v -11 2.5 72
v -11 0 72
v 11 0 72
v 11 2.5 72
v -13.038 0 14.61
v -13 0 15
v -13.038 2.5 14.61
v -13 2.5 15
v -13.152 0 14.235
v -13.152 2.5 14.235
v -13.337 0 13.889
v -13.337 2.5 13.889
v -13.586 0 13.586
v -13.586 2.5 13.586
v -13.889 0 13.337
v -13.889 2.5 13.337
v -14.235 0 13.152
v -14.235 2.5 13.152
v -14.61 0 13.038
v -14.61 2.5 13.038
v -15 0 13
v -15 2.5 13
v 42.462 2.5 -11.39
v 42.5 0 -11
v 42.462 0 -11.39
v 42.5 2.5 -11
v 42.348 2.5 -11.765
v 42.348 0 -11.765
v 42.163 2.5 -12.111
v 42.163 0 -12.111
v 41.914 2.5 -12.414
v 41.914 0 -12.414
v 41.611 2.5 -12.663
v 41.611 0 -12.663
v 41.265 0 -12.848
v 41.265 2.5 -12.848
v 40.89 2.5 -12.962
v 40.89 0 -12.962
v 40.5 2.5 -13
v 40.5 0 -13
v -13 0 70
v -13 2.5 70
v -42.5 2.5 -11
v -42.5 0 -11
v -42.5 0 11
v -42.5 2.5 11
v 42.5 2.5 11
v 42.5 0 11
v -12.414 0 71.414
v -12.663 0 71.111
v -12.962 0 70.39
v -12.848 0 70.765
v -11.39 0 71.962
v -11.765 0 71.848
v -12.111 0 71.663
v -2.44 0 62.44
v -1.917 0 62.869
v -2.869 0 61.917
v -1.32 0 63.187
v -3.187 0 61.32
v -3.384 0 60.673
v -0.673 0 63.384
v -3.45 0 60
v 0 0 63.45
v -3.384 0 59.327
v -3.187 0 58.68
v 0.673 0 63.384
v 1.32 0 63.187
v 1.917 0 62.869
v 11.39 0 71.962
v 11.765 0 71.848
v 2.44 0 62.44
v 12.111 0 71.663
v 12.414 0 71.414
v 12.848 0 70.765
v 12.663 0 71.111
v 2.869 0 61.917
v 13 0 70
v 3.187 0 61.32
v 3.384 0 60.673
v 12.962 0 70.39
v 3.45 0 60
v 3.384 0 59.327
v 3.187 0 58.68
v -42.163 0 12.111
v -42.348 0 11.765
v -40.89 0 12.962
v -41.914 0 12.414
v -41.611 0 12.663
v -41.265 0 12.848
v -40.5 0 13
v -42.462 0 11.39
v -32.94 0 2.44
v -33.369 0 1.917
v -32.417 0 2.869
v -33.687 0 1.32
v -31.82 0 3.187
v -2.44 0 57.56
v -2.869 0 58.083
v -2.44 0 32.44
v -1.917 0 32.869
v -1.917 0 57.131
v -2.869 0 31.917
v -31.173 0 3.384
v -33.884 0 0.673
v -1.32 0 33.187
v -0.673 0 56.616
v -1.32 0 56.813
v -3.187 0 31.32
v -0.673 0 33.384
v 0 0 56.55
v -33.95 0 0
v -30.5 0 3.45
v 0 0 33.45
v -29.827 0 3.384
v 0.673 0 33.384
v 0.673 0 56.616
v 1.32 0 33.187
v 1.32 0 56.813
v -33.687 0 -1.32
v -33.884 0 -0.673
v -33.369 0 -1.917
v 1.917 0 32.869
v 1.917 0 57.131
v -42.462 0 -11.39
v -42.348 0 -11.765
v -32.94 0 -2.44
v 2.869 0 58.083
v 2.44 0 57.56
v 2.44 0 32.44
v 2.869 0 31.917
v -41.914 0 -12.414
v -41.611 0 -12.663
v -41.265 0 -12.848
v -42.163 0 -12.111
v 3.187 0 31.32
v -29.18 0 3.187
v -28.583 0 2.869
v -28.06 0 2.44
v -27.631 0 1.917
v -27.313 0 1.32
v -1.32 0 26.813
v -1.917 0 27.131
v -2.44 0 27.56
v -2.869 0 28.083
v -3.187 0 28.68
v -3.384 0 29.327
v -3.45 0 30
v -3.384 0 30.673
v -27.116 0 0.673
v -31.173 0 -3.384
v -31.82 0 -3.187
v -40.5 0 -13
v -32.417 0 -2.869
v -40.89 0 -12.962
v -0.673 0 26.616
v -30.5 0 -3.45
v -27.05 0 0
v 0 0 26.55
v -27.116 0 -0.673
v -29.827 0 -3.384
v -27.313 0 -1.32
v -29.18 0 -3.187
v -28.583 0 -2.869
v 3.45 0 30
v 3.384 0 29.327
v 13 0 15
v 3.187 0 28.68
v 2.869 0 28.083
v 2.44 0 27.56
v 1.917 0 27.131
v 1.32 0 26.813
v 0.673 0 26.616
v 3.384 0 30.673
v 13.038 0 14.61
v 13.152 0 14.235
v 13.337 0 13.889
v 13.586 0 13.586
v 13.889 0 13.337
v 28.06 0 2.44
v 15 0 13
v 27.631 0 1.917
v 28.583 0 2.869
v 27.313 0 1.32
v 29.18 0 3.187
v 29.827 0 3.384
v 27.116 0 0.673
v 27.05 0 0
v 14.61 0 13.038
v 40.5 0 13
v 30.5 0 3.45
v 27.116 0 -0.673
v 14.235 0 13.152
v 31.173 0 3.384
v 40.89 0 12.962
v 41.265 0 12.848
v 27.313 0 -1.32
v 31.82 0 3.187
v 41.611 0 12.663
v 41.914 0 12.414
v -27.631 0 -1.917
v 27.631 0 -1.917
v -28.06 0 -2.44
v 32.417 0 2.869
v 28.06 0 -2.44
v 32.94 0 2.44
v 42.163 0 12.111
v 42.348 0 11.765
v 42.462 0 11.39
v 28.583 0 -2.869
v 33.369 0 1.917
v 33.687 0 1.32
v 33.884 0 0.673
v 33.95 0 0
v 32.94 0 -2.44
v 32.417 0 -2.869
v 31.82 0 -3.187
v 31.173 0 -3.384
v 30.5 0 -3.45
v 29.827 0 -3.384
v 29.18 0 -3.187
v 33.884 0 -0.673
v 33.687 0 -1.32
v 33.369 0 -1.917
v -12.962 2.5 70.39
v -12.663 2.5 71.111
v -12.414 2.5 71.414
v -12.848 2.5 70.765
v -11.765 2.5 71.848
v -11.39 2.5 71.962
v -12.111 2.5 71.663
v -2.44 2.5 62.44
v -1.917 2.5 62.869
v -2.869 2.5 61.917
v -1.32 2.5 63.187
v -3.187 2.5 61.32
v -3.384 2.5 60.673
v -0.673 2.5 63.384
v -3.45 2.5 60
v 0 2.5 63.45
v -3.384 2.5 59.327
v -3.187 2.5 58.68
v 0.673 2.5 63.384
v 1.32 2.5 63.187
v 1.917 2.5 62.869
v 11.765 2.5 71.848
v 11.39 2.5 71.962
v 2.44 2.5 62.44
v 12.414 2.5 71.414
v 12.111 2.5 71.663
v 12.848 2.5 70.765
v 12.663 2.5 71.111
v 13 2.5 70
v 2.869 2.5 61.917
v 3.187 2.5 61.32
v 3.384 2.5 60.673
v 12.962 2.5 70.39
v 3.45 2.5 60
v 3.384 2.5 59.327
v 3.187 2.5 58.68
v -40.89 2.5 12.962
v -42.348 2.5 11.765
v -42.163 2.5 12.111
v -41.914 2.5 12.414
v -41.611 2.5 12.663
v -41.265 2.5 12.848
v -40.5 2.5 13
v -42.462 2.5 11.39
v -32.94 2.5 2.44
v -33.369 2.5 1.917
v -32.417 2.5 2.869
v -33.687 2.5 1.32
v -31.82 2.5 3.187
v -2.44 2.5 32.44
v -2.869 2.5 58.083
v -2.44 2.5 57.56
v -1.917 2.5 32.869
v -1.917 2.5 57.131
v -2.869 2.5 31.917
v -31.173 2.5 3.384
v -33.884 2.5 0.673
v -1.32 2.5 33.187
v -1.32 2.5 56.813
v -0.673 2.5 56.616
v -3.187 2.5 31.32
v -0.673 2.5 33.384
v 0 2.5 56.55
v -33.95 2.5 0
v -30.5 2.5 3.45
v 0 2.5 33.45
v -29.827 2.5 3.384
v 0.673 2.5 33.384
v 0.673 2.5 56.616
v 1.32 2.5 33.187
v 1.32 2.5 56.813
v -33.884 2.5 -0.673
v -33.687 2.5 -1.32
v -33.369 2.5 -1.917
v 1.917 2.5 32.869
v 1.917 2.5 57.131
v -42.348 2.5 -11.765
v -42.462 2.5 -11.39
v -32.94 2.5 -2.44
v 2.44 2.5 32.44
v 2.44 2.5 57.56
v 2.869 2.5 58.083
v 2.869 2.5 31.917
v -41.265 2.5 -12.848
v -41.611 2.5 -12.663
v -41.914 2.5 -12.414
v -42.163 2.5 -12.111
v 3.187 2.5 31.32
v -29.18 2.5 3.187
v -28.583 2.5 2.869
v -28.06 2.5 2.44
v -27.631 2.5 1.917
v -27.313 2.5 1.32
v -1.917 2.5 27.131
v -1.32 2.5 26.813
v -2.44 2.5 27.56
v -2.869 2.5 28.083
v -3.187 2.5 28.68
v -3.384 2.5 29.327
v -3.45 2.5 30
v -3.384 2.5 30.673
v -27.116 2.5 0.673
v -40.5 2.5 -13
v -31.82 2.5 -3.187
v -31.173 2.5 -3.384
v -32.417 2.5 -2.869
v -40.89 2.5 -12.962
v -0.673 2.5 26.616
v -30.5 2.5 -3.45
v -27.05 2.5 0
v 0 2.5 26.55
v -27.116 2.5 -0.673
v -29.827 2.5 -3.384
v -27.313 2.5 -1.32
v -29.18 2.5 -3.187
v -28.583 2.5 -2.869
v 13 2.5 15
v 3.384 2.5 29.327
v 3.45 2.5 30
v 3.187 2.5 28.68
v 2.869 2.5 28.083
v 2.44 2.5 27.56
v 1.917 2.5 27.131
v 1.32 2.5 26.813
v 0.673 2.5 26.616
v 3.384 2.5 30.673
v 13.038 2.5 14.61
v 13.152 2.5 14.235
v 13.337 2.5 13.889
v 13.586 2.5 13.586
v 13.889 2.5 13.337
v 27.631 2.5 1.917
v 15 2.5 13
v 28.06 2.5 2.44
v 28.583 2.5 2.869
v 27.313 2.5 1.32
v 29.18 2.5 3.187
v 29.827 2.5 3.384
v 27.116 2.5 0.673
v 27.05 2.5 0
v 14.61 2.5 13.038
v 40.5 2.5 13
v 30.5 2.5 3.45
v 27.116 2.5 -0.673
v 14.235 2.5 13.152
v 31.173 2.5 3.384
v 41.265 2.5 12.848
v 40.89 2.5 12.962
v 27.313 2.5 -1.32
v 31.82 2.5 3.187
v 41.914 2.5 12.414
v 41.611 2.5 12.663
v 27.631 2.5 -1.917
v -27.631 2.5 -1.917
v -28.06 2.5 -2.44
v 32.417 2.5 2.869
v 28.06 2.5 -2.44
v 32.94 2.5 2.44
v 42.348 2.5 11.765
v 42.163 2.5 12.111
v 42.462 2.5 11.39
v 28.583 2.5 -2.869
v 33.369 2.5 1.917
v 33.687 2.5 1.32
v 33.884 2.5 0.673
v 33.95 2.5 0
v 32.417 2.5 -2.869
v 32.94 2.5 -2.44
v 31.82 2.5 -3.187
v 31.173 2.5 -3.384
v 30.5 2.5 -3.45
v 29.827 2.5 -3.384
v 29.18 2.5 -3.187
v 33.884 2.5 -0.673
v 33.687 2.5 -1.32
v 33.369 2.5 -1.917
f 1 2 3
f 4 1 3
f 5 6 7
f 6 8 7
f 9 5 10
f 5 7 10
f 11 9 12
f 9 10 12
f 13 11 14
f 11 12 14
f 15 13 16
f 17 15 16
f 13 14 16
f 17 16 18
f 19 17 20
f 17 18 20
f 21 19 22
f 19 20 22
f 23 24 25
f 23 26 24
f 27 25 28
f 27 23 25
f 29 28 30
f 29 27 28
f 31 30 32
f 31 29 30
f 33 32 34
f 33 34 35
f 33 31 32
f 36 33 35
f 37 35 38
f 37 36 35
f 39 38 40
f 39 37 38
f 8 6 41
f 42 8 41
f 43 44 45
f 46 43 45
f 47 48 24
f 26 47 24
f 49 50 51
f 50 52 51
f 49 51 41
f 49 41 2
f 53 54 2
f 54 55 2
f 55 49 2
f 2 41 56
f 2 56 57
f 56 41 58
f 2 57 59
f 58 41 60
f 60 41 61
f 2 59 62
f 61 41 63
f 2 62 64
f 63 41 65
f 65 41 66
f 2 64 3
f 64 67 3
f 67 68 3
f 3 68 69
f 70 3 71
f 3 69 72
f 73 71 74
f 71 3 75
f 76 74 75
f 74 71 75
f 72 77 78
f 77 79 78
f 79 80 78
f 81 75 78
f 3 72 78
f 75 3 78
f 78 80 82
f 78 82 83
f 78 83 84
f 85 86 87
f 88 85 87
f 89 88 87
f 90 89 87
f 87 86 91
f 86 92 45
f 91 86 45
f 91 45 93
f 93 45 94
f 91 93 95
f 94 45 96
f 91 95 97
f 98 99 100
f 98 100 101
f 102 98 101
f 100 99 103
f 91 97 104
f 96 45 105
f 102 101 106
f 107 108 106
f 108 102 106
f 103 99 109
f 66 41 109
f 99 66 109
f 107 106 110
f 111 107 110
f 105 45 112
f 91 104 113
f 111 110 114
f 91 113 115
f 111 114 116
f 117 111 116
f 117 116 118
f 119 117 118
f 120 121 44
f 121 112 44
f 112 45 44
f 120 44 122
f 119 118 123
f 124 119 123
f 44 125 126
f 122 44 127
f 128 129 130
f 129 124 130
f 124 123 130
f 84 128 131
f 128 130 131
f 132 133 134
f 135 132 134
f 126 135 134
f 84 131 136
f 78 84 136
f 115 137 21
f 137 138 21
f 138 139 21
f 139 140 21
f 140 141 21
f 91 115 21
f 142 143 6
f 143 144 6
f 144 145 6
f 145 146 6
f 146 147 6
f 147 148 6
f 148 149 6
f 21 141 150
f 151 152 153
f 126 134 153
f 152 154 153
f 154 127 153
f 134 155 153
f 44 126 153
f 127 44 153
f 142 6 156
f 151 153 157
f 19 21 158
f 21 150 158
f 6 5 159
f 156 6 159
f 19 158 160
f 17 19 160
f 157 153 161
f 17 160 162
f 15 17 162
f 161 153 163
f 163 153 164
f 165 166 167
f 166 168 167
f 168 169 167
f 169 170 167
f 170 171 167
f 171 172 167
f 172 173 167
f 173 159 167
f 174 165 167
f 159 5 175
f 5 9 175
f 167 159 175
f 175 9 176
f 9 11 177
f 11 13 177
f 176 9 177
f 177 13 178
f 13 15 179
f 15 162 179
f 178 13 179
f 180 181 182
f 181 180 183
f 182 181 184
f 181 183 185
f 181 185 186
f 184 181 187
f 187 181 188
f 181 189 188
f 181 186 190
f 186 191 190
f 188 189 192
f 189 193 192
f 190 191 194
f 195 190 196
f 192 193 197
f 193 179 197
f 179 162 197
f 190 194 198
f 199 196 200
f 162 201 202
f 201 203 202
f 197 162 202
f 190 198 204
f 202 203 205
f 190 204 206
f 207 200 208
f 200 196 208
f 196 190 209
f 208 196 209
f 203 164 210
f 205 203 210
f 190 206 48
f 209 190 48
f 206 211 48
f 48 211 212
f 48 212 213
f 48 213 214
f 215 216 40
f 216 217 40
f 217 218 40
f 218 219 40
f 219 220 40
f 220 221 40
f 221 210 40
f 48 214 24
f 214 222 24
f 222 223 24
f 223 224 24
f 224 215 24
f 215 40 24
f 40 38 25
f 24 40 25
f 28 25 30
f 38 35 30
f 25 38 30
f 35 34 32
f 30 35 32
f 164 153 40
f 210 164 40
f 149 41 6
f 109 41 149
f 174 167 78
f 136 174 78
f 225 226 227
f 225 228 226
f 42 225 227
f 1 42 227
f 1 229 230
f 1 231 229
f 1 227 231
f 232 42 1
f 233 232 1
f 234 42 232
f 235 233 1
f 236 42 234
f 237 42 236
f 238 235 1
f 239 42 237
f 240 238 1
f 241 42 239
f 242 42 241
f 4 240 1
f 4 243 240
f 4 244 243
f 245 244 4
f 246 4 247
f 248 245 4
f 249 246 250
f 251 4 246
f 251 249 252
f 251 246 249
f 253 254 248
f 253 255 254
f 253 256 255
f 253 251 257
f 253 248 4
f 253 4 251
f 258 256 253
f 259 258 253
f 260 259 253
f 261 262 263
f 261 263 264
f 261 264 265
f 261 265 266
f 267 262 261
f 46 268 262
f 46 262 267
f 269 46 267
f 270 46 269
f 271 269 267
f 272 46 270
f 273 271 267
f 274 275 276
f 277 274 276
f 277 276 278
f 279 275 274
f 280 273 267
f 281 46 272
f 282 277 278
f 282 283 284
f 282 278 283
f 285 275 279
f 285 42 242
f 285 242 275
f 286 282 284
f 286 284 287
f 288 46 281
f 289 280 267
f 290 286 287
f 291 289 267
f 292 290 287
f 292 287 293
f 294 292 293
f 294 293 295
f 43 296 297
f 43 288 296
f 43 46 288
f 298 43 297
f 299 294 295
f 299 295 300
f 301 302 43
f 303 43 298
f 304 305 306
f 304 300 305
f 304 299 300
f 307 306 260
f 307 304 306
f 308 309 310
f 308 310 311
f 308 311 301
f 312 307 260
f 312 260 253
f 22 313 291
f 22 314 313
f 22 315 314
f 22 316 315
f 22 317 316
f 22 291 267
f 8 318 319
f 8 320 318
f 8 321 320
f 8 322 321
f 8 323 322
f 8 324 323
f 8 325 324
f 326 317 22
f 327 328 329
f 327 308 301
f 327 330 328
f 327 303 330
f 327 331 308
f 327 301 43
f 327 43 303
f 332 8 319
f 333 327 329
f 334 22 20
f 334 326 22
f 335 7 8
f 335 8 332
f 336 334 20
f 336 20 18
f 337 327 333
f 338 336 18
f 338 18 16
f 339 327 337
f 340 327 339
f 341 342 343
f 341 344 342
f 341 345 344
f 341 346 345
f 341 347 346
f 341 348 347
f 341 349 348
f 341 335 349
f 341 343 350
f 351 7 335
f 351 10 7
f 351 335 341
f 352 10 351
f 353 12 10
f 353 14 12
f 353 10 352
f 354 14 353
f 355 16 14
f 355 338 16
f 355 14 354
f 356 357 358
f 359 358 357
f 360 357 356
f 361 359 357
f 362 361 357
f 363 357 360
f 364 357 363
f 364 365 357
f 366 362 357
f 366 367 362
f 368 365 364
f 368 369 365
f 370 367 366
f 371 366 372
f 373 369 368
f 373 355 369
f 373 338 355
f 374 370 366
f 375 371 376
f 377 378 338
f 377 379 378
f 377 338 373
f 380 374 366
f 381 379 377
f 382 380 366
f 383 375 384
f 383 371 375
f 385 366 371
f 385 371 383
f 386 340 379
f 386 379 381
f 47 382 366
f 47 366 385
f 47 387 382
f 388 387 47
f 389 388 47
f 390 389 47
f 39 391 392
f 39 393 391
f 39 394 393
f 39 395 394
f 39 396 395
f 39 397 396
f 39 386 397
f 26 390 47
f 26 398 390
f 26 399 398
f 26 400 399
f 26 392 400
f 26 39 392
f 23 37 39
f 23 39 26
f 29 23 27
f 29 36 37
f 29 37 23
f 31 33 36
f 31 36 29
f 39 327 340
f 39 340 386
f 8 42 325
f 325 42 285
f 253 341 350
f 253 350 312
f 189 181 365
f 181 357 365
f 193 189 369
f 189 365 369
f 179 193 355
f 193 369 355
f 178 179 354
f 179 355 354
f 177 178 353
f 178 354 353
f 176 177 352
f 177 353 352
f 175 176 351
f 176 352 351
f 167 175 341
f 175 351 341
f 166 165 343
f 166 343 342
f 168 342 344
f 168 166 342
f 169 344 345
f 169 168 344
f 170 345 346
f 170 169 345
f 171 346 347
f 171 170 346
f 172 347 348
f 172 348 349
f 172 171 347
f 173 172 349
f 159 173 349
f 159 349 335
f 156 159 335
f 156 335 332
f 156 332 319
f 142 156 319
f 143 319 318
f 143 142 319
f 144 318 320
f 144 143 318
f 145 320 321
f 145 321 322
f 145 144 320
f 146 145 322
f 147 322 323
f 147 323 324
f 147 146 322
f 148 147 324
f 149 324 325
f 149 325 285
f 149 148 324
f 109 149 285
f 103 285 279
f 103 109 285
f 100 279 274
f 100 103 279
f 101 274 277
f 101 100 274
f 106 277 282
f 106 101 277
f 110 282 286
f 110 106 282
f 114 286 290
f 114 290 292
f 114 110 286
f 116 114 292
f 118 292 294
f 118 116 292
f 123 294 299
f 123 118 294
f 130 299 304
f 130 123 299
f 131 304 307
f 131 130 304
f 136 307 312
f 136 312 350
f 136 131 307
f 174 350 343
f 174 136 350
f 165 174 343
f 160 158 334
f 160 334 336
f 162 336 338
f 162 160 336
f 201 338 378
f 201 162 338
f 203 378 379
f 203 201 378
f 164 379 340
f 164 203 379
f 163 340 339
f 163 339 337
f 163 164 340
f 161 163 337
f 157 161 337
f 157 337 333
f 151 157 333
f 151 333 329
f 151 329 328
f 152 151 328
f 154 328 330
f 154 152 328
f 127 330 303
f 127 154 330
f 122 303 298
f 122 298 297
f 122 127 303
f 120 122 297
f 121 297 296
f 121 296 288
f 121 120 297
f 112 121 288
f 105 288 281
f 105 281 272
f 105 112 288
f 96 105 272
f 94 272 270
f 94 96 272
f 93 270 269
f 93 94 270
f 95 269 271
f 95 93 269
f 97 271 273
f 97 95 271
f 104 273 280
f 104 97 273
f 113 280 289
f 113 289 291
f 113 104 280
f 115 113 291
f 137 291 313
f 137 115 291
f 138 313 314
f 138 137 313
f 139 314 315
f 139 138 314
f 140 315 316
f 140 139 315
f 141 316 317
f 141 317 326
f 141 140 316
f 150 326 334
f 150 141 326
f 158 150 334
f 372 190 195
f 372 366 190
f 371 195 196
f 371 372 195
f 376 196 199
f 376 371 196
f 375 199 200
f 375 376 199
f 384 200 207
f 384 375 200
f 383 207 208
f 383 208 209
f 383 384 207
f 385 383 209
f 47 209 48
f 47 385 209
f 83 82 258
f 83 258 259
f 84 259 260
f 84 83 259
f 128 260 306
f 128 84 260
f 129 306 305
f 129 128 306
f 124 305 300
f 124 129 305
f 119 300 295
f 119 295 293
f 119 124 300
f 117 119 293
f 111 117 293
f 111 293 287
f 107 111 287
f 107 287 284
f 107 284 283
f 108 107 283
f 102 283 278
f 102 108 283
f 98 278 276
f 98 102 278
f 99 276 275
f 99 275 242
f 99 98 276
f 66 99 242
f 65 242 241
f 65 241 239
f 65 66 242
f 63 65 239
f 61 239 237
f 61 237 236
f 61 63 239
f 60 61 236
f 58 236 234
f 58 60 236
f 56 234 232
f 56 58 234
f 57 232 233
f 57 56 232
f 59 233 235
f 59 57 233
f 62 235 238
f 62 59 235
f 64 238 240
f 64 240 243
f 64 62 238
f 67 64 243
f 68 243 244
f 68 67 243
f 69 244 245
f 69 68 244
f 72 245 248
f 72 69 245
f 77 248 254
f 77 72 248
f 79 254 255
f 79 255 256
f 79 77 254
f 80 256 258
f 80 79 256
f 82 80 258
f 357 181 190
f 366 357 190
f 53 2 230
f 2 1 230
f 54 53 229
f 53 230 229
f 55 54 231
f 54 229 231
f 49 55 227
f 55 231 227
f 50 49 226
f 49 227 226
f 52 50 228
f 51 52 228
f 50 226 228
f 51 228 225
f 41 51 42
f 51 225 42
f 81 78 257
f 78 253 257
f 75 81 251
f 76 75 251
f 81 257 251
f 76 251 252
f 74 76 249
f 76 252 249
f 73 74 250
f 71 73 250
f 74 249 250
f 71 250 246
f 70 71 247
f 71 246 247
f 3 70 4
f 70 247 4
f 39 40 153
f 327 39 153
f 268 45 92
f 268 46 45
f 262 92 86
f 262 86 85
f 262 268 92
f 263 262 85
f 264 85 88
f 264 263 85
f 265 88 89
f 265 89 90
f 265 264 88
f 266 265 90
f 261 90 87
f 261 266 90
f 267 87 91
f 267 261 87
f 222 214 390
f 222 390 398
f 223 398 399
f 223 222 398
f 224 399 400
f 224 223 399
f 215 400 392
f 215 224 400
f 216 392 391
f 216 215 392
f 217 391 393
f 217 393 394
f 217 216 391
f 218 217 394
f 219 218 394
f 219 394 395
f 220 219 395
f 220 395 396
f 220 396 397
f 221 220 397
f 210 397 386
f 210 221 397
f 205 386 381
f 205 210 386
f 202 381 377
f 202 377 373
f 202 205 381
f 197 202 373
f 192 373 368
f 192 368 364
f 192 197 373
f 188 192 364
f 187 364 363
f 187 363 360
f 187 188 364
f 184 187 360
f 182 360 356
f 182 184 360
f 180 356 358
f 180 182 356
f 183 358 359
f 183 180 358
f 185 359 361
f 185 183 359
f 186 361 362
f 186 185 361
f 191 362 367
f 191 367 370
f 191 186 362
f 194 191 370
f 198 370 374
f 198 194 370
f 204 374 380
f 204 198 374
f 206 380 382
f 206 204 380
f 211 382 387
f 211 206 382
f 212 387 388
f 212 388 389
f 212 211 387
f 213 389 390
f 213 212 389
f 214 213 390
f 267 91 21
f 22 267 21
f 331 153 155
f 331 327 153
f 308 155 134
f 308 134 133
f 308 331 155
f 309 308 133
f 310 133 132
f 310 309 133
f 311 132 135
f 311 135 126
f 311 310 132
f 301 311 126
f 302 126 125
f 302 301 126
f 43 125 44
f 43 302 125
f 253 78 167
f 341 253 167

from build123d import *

# Parameters (mm, degrees)
SKETCH_1_R      = 3.45
EXTRUDE_1_DEPTH = 2.5
FILLET_1_R      = 2


with BuildPart() as part:
    # 草图1 → 凸台-拉伸1 (new body)
    with BuildSketch(Plane(origin=(0, 0, 0), x_dir=(1, 0, 0), z_dir=(0, 1, 0))):
        Polygon((13, -13), (42.5, -13), (42.5, 13), (-42.5, 13), (-42.5, -13), (-13, -13), (-13, -72), (13, -72), align=None)
        with Locations((0, -60)):
            Circle(SKETCH_1_R, mode=Mode.SUBTRACT)
        with Locations((0, -30)):
            Circle(SKETCH_1_R, mode=Mode.SUBTRACT)
        with Locations((-30.5, 0)):
            Circle(SKETCH_1_R, mode=Mode.SUBTRACT)
        with Locations((30.5, 0)):
            Circle(SKETCH_1_R, mode=Mode.SUBTRACT)
    extrude(amount=EXTRUDE_1_DEPTH)

    # 圆角1
    fillet_1_edges = [part.edges().sort_by_distance(p)[0] for p in [
        (42.5, 1.25, 13),
        (13, 1.25, 13),
        (13, 1.25, 72),
        (-13, 1.25, 72),
        (-13, 1.25, 13),
        (-42.5, 1.25, 13),
        (-42.5, 1.25, -13),
        (42.5, 1.25, -13),
    ]]
    fillet(fillet_1_edges, radius=FILLET_1_R)


solid = part.part
